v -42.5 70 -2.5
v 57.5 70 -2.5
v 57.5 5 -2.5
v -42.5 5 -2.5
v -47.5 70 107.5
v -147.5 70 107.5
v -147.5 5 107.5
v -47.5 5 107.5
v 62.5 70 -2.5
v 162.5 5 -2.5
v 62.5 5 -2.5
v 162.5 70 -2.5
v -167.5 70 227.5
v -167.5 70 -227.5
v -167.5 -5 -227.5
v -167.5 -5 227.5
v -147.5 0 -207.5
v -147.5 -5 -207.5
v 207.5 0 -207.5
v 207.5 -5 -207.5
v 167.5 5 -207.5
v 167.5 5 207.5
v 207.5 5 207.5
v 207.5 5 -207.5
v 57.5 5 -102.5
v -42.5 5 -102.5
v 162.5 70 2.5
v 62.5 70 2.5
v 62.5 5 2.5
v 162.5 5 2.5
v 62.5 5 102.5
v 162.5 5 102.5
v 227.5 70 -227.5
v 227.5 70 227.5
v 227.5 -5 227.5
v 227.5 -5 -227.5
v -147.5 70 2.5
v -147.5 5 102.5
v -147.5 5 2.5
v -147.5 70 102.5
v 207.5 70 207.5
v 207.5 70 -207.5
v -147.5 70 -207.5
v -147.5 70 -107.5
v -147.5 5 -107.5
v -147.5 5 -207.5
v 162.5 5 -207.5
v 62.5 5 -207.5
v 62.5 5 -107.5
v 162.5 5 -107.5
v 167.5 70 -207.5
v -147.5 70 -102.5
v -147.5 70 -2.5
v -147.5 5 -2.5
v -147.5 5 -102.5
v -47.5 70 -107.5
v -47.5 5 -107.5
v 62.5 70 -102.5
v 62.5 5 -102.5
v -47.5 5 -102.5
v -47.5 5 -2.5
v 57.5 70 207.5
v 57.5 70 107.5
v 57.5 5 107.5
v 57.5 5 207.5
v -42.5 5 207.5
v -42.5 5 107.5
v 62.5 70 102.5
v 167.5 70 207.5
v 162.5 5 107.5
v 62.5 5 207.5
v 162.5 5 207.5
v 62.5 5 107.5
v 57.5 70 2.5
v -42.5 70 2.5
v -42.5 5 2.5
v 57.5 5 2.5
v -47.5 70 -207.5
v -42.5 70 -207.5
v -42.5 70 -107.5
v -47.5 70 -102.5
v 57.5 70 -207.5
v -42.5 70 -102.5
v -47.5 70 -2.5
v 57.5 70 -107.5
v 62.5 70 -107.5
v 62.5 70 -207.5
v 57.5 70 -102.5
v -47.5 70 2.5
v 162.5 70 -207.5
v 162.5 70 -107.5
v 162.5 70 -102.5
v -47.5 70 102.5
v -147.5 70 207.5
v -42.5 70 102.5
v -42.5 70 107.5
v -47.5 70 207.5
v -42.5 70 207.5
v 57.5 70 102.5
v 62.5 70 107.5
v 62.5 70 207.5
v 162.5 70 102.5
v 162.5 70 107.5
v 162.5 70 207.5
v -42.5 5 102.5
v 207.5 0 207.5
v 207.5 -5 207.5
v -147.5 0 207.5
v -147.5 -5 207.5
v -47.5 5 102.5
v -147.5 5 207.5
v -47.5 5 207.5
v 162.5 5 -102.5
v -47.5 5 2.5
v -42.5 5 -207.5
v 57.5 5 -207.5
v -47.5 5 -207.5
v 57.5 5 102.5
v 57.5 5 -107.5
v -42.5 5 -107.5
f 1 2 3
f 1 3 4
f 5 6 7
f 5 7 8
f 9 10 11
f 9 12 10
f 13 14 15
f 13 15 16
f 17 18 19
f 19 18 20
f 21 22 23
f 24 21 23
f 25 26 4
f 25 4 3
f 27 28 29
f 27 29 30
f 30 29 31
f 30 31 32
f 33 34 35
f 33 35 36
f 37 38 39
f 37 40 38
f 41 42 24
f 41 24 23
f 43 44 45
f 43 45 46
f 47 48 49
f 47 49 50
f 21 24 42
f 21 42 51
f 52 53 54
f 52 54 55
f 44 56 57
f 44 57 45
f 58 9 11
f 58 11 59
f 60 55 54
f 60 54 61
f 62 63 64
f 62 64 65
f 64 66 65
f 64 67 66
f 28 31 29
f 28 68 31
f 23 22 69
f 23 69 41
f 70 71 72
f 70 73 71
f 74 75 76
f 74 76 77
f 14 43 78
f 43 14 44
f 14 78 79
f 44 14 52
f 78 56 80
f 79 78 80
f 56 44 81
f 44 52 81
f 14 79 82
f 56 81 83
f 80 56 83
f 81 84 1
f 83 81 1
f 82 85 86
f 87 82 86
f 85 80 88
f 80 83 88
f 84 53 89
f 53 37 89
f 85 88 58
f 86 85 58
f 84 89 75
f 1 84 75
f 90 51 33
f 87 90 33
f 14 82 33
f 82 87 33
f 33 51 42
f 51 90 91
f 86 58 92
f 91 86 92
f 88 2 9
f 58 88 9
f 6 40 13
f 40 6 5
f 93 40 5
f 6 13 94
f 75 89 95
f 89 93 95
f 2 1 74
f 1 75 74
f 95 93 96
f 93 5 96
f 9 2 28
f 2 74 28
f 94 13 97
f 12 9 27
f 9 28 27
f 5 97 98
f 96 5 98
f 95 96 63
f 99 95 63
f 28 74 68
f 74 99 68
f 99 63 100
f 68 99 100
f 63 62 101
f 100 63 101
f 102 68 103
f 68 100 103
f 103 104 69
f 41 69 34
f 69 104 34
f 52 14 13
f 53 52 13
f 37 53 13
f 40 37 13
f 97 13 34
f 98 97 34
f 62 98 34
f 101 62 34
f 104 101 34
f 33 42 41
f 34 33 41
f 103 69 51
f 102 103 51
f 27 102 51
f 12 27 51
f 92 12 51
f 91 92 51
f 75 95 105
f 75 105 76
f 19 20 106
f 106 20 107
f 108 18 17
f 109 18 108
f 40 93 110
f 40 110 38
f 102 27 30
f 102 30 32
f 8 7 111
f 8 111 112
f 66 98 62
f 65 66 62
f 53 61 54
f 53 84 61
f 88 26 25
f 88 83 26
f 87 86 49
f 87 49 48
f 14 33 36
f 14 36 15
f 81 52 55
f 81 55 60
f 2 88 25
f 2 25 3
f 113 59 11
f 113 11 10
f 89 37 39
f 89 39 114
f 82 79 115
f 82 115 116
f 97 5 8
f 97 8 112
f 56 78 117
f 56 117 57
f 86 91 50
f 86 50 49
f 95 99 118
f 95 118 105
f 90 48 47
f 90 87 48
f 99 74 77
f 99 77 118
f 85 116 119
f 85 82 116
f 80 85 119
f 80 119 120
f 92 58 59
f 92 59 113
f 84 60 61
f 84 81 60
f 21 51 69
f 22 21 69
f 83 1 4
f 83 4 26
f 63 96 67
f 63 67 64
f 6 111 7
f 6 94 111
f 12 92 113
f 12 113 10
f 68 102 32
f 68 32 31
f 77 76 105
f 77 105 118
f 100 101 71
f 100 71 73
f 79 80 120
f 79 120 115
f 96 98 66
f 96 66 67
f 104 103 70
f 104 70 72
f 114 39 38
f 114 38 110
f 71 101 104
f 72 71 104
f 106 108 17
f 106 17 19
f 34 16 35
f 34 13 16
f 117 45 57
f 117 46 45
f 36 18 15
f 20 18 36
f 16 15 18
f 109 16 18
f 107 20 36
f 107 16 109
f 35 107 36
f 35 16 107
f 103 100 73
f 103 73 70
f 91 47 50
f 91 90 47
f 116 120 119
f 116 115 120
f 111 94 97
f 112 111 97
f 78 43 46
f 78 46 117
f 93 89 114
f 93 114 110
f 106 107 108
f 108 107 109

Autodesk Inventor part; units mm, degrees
ref_plane "YZ Plane" through (0, 0, 0) normal (1, 0, 0) x (0, 1, 0)
ref_plane "XZ Plane" through (0, 0, 0) normal (0, 1, 0) x (-1, 0, 0)
ref_plane "XY Plane" through (0, 0, 0) normal (0, 0, 1) x (1, 0, 0)
sketch "Эскиз1" plane through (0, 0, 0) normal (0, 1, 0) x (-1, 0, 0)
  line L0 (167.5, -227.5) -> (-167.5, -227.5)
  line L1 (-167.5, -227.5) -> (-167.5, 227.5)
  line L2 (-167.5, 227.5) -> (167.5, 227.5)
  line L3 (167.5, 227.5) -> (167.5, -227.5)
  line L4 (167.5, -227.5) -> (-167.5, 227.5) construction
  line L5 (-167.5, -227.5) -> (167.5, 227.5) construction
  point P0 (0, 0)
  dimension "d0" = 335
  dimension "d1" = 455
extrude "Выдавливание1" add sketch "Эскиз1" along normal blind 70
sketch "Эскиз2" plane through (0, 70, 0) normal (0, 1, 0) x (1, 0, 0)
  line L0 (167.5, 227.5) -> (-167.5, 227.5) projected
  line L1 (-147.5, 227.5) -> (-147.5, -225.4146) construction
  line L2 (-167.5, 227.5) -> (-167.5, -227.5) projected
  line L3 (-167.5, 207.5) -> (167.5, 207.5)
  line L4 (-167.5, -207.5) -> (167.5, -207.5)
  line L5 (167.5, -227.5) -> (167.5, 227.5) projected
  line L6 (-167.5, -227.5) -> (167.5, -227.5) projected
  line L7 (162.5, 227.5) -> (162.5, -227.5)
  line L8 (-147.5, 207.5) -> (-47.5, 207.5)
  line L9 (-47.5, 207.5) -> (-47.5, 107.5)
  line L10 (-47.5, 107.5) -> (-147.5, 107.5)
  line L11 (-147.5, 107.5) -> (-147.5, 207.5)
  line L12 (-42.5, 107.5) -> (-42.5, 207.5)
  line L13 (-42.5, 207.5) -> (57.5, 207.5)
  line L14 (57.5, 207.5) -> (57.5, 107.5)
  line L15 (57.5, 107.5) -> (-42.5, 107.5)
  line L16 (62.5, 107.5) -> (62.5, 207.5)
  line L17 (62.5, 207.5) -> (162.5, 207.5)
  line L18 (162.5, 207.5) -> (162.5, 107.5)
  line L19 (162.5, 107.5) -> (62.5, 107.5)
  line L20 (-147.5, 2.5) -> (-147.5, 102.5)
  line L21 (-147.5, 102.5) -> (-47.5, 102.5)
  line L22 (-47.5, 102.5) -> (-47.5, 2.5)
  line L23 (-47.5, 2.5) -> (-147.5, 2.5)
  line L24 (-42.5, 2.5) -> (-42.5, 102.5)
  line L25 (-42.5, 102.5) -> (57.5, 102.5)
  line L26 (57.5, 102.5) -> (57.5, 2.5)
  line L27 (57.5, 2.5) -> (-42.5, 2.5)
  line L28 (62.5, 2.5) -> (62.5, 102.5)
  line L29 (62.5, 102.5) -> (162.5, 102.5)
  line L30 (162.5, 102.5) -> (162.5, 2.5)
  line L31 (162.5, 2.5) -> (62.5, 2.5)
  line L32 (-147.5, -102.5) -> (-147.5, -2.5)
  line L33 (-147.5, -2.5) -> (-47.5, -2.5)
  line L34 (-47.5, -2.5) -> (-47.5, -102.5)
  line L35 (-47.5, -102.5) -> (-147.5, -102.5)
  line L36 (-42.5, -102.5) -> (-42.5, -2.5)
  line L37 (-42.5, -2.5) -> (57.5, -2.5)
  line L38 (57.5, -2.5) -> (57.5, -102.5)
  line L39 (57.5, -102.5) -> (-42.5, -102.5)
  line L40 (62.5, -102.5) -> (62.5, -2.5)
  line L41 (62.5, -2.5) -> (162.5, -2.5)
  line L42 (162.5, -2.5) -> (162.5, -102.5)
  line L43 (162.5, -102.5) -> (62.5, -102.5)
  line L44 (-147.5, -207.5) -> (-147.5, -107.5)
  line L45 (-147.5, -107.5) -> (-47.5, -107.5)
  line L46 (-47.5, -107.5) -> (-47.5, -207.5)
  line L47 (-47.5, -207.5) -> (-147.5, -207.5)
  line L48 (-42.5, -207.5) -> (-42.5, -107.5)
  line L49 (-42.5, -107.5) -> (57.5, -107.5)
  line L50 (57.5, -107.5) -> (57.5, -207.5)
  line L51 (57.5, -207.5) -> (-42.5, -207.5)
  line L52 (62.5, -207.5) -> (62.5, -107.5)
  line L53 (62.5, -107.5) -> (162.5, -107.5)
  line L54 (162.5, -107.5) -> (162.5, -207.5)
  line L55 (162.5, -207.5) -> (62.5, -207.5)
  point P0 (0, 0)
  point P1 (162.5, -207.5)
  point P2 (162.5, 207.5)
  dimension "d4" = 20
  dimension "d5" = 20
  dimension "d6" = 20
  dimension "d7" = 5
  dimension "d8" = 100
  dimension "d9" = 100
  dimension "d12" = 105
  dimension "d15" = 105
extrude "Выдавливание2" cut sketch "Эскиз2" against normal blind 65 contours L7 L19 L16 L3 | L4 L52 L53 L7 | L3 L9 L10 L11 | L14 L15 L12 L3 | L7 L31 L28 L29 | L44 L45 L46 L4 | L4 L48 L49 L50 | L43 L40 L41 L7 | L20 L21 L22 L23 | L24 L25 L26 L27 | L32 L33 L34 L35 | L36 L37 L38 L39
sketch "Эскиз6" plane through (0, 0, 0) normal (0, -1, 0) x (1, 0, 0)
  line L0 (167.5, -227.5) -> (227.5, -227.5)
  line L1 (227.5, -227.5) -> (227.5, 227.5)
  line L2 (227.5, 227.5) -> (167.5, 227.5)
  line L3 (167.5, 227.5) -> (167.5, -227.5)
  point P0 (0, 0)
  dimension "d29" = 60
extrude "Выдавливание5" add sketch "Эскиз6" against normal blind 70
sketch "Эскиз7" plane through (0, 70, 0) normal (0, 1, 0) x (1, 0, 0)
  line L0 (227.5, 227.5) -> (-167.5, 227.5) projected
  line L1 (207.5, 227.5) -> (207.5, -226.0922)
  line L2 (227.5, -227.5) -> (227.5, 227.5) projected
  line L3 (227.5, 207.5) -> (-167.5, 207.5)
  line L4 (207.5, 207.5) -> (167.5, 207.5)
  line L5 (167.5, 207.5) -> (167.5, -207.5)
  line L6 (167.5, -207.5) -> (207.5, -207.5)
  line L7 (207.5, -207.5) -> (207.5, 207.5)
  point P0 (0, 0)
  dimension "d32" = 20
  dimension "d33" = 20
  dimension "d34" = 40
  dimension "d35" = 415
extrude "Выдавливание6" cut sketch "Эскиз7" against normal blind 65 contours L1 L6 L5 L3
ref_plane "РабПлоскость2" through (0, 0, 0) normal (0, -1, 0) x (1, 0, 0)
sketch "Эскиз8" plane through (0, 0, 0) normal (0, -1, 0) x (1, 0, 0)
  point P0 (0, 0)
sketch "Эскиз9" plane through (0, 0, 0) normal (0, -1, 0) x (1, 0, 0)
  line L0 (-167.5, -227.5) -> (-167.5, 227.5) projected
  line L1 (227.5, -227.5) -> (-167.5, -227.5) projected
  line L2 (-167.5, 227.5) -> (227.5, 227.5)
  line L3 (227.5, 227.5) -> (227.5, -227.5)
  line L4 (227.5, -227.5) -> (-167.5, -227.5)
  line L5 (-167.5, -227.5) -> (-167.5, 227.5)
  point P0 (0, 0)
sketch "Эскиз10" plane through (0, 0, 0) normal (0, -1, 0) x (1, 0, 0)
  point P0 (0, 0)
sketch "Эскиз11" plane through (0, 0, 0) normal (0, -1, 0) x (1, 0, 0)
  line L0 (-167.5, -227.5) -> (-167.5, 227.5) projected
  line L1 (227.5, -227.5) -> (-167.5, -227.5) projected
  line L2 (-167.5, 227.5) -> (227.5, 227.5)
  line L3 (227.5, 227.5) -> (227.5, -227.5)
  line L4 (227.5, -227.5) -> (-167.5, -227.5)
  line L5 (-167.5, -227.5) -> (-167.5, 227.5)
  point P0 (0, 0)
extrude "Выдавливание7" add sketch "Эскиз11" along normal blind 5
sketch "Эскиз12" plane through (0, -5, 0) normal (0, -1, 0) x (1, 0, 0)
  line L0 (-147.5, -229.7416) -> (-147.5, 227.5)
  line L1 (-167.5, 227.5) -> (227.5, 227.5) projected
  line L2 (-167.5, 227.5) -> (-167.5, -227.5) projected
  line L3 (-167.5, -207.5) -> (227.5, -207.5)
  line L4 (227.5, 227.5) -> (227.5, -227.5) projected
  line L5 (-167.5, -227.5) -> (227.5, -227.5) projected
  line L6 (207.5, 207.5) -> (167.5, 207.5) projected
  line L7 (-147.5, -207.5) -> (207.5, -207.5)
  line L8 (207.5, -207.5) -> (207.5, 207.5)
  line L9 (207.5, 207.5) -> (-147.5, 207.5)
  line L10 (-147.5, 207.5) -> (-147.5, -207.5)
  point P0 (0, 0)
  dimension "d41" = 20
  dimension "d42" = 20
extrude "Выдавливание8" cut sketch "Эскиз12" against normal blind 5 contours L0 L9 L6 L8 L3
properties part number "ключница"
